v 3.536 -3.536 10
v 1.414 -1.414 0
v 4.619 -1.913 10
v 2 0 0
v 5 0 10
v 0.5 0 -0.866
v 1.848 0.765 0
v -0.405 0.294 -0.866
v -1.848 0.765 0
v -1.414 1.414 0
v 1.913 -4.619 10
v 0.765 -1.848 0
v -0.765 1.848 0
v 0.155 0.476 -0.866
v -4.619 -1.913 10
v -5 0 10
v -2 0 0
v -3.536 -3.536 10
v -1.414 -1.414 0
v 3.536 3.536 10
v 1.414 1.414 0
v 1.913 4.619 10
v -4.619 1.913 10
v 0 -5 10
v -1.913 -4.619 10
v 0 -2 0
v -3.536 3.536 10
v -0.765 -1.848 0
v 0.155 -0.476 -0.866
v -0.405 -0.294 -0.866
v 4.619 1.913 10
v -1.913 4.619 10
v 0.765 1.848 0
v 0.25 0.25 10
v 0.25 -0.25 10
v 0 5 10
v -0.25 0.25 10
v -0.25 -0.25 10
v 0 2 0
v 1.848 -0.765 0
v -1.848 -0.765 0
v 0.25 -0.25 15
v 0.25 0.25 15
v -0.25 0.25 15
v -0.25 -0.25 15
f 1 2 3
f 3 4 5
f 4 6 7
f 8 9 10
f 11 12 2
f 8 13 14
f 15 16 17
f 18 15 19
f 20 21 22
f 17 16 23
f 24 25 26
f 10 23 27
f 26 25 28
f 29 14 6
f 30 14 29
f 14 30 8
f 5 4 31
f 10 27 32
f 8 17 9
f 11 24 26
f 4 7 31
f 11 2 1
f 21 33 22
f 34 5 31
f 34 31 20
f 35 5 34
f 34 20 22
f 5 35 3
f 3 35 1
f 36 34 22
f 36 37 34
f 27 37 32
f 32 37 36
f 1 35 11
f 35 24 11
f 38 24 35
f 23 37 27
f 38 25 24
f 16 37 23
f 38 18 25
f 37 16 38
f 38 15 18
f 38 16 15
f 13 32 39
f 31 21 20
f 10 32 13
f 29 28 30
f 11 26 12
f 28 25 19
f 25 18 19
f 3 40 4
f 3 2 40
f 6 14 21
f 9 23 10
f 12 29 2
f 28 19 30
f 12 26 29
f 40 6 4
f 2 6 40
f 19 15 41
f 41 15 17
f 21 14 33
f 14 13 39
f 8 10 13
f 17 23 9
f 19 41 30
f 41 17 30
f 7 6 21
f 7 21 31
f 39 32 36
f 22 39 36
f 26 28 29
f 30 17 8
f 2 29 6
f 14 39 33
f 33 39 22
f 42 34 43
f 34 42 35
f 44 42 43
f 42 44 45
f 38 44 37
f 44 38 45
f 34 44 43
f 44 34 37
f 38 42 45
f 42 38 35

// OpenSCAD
//Preston Knibbe
//B7
//pknibbe3@gatech.edu
//903074340
//I worked on the homework assignment alone, using only this semester's course materials
//This object is a top, a popular childrens toy, and I got the idea when seeing how the hull function works

module topTop(a,b,c){
	color([200/255,167/255,105/255])
	translate([0,0,10])
	cube([a,b,c],center=true);
}

color([211/255,42/255,42/255])
hull(){

translate([0,0,5])

	cylinder(10,2,5,center=true);
	sphere([5,5,5]);


}
topTop(.5,.5,10);
